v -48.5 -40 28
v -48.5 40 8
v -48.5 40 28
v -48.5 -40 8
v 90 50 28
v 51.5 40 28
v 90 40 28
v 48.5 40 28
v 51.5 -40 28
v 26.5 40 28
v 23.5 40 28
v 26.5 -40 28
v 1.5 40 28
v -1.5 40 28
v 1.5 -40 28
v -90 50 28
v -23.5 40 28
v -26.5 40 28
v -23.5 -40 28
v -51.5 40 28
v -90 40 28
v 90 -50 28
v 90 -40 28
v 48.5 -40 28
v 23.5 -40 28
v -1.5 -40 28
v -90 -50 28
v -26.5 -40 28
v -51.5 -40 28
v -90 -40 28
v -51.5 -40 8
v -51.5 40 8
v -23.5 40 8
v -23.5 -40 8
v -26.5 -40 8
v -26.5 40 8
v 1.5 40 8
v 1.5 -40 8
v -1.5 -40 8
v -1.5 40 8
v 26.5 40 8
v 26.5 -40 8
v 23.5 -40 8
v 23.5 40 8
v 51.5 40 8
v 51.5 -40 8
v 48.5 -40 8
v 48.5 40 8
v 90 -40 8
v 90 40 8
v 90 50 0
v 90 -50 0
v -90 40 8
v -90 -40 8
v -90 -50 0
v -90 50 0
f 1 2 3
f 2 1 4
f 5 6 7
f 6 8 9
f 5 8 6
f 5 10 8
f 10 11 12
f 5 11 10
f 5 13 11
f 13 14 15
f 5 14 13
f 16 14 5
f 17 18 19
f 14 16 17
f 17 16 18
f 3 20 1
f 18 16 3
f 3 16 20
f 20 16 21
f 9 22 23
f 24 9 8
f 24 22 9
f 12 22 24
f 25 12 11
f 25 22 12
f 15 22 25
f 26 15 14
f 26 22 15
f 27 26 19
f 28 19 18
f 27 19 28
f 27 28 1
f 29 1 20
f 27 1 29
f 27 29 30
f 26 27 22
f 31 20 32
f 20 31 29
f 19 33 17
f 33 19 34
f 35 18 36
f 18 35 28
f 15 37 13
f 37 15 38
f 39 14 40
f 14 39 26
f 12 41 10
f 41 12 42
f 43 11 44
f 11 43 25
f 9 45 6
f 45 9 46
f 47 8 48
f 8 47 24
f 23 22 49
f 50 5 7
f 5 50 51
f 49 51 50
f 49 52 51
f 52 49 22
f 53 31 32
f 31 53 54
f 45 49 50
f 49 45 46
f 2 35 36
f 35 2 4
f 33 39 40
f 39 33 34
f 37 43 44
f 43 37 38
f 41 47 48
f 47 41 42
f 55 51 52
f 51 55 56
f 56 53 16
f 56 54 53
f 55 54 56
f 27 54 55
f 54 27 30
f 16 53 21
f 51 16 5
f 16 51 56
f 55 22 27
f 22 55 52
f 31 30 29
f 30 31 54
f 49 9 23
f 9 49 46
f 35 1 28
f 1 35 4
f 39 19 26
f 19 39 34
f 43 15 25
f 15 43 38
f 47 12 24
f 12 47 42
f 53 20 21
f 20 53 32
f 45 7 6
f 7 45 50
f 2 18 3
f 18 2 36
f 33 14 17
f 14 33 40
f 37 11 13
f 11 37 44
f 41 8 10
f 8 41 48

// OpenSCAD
$fn = 32;

// ----------------------------------------------------------------------
// Rib frame 180 x 100 x 28
// 5 ribs at 25 mm pitch
// ----------------------------------------------------------------------

// --- parameters (mm) ---
frame = [180, 100, 8];  // base plate size (x, y, z)
rail_w = 10;            // side rail width
ribs = 5;               // number of ribs
rib_t = 3;              // rib thickness
rib_h = 20;             // rib height above the base plate
pitch = 25;             // pitch between rib centres

// --- derived feature positions (mm) ---
span = (ribs - 1) * pitch;          // = 100   distance between the outer ribs
origin_x = -span / 2;               // = -50   X of the first rib
rib_len = frame[1] - 2 * rail_w + 2;  // = 82   rib length, 1 mm into each rail
feature_centers = [
  [origin_x + 0 * pitch, 0],
  [origin_x + 1 * pitch, 0],
  [origin_x + 2 * pitch, 0],
  [origin_x + 3 * pitch, 0],
  [origin_x + 4 * pitch, 0]
];   // rib centre line, drives the rib loop

// base plate, two side rails, then the ribs read straight off feature_centers
union() {
  translate([-frame[0] / 2, -frame[1] / 2, 0]) cube(frame);
  translate([-frame[0] / 2, -frame[1] / 2, 0]) cube([frame[0], rail_w, frame[2] + rib_h]);
  translate([-frame[0] / 2, frame[1] / 2 - rail_w, 0]) cube([frame[0], rail_w, frame[2] + rib_h]);
  for (centre = feature_centers)
    translate([centre[0] - rib_t / 2, centre[1] - rib_len / 2, frame[2] - 1])
      cube([rib_t, rib_len, rib_h + 1]);
}
